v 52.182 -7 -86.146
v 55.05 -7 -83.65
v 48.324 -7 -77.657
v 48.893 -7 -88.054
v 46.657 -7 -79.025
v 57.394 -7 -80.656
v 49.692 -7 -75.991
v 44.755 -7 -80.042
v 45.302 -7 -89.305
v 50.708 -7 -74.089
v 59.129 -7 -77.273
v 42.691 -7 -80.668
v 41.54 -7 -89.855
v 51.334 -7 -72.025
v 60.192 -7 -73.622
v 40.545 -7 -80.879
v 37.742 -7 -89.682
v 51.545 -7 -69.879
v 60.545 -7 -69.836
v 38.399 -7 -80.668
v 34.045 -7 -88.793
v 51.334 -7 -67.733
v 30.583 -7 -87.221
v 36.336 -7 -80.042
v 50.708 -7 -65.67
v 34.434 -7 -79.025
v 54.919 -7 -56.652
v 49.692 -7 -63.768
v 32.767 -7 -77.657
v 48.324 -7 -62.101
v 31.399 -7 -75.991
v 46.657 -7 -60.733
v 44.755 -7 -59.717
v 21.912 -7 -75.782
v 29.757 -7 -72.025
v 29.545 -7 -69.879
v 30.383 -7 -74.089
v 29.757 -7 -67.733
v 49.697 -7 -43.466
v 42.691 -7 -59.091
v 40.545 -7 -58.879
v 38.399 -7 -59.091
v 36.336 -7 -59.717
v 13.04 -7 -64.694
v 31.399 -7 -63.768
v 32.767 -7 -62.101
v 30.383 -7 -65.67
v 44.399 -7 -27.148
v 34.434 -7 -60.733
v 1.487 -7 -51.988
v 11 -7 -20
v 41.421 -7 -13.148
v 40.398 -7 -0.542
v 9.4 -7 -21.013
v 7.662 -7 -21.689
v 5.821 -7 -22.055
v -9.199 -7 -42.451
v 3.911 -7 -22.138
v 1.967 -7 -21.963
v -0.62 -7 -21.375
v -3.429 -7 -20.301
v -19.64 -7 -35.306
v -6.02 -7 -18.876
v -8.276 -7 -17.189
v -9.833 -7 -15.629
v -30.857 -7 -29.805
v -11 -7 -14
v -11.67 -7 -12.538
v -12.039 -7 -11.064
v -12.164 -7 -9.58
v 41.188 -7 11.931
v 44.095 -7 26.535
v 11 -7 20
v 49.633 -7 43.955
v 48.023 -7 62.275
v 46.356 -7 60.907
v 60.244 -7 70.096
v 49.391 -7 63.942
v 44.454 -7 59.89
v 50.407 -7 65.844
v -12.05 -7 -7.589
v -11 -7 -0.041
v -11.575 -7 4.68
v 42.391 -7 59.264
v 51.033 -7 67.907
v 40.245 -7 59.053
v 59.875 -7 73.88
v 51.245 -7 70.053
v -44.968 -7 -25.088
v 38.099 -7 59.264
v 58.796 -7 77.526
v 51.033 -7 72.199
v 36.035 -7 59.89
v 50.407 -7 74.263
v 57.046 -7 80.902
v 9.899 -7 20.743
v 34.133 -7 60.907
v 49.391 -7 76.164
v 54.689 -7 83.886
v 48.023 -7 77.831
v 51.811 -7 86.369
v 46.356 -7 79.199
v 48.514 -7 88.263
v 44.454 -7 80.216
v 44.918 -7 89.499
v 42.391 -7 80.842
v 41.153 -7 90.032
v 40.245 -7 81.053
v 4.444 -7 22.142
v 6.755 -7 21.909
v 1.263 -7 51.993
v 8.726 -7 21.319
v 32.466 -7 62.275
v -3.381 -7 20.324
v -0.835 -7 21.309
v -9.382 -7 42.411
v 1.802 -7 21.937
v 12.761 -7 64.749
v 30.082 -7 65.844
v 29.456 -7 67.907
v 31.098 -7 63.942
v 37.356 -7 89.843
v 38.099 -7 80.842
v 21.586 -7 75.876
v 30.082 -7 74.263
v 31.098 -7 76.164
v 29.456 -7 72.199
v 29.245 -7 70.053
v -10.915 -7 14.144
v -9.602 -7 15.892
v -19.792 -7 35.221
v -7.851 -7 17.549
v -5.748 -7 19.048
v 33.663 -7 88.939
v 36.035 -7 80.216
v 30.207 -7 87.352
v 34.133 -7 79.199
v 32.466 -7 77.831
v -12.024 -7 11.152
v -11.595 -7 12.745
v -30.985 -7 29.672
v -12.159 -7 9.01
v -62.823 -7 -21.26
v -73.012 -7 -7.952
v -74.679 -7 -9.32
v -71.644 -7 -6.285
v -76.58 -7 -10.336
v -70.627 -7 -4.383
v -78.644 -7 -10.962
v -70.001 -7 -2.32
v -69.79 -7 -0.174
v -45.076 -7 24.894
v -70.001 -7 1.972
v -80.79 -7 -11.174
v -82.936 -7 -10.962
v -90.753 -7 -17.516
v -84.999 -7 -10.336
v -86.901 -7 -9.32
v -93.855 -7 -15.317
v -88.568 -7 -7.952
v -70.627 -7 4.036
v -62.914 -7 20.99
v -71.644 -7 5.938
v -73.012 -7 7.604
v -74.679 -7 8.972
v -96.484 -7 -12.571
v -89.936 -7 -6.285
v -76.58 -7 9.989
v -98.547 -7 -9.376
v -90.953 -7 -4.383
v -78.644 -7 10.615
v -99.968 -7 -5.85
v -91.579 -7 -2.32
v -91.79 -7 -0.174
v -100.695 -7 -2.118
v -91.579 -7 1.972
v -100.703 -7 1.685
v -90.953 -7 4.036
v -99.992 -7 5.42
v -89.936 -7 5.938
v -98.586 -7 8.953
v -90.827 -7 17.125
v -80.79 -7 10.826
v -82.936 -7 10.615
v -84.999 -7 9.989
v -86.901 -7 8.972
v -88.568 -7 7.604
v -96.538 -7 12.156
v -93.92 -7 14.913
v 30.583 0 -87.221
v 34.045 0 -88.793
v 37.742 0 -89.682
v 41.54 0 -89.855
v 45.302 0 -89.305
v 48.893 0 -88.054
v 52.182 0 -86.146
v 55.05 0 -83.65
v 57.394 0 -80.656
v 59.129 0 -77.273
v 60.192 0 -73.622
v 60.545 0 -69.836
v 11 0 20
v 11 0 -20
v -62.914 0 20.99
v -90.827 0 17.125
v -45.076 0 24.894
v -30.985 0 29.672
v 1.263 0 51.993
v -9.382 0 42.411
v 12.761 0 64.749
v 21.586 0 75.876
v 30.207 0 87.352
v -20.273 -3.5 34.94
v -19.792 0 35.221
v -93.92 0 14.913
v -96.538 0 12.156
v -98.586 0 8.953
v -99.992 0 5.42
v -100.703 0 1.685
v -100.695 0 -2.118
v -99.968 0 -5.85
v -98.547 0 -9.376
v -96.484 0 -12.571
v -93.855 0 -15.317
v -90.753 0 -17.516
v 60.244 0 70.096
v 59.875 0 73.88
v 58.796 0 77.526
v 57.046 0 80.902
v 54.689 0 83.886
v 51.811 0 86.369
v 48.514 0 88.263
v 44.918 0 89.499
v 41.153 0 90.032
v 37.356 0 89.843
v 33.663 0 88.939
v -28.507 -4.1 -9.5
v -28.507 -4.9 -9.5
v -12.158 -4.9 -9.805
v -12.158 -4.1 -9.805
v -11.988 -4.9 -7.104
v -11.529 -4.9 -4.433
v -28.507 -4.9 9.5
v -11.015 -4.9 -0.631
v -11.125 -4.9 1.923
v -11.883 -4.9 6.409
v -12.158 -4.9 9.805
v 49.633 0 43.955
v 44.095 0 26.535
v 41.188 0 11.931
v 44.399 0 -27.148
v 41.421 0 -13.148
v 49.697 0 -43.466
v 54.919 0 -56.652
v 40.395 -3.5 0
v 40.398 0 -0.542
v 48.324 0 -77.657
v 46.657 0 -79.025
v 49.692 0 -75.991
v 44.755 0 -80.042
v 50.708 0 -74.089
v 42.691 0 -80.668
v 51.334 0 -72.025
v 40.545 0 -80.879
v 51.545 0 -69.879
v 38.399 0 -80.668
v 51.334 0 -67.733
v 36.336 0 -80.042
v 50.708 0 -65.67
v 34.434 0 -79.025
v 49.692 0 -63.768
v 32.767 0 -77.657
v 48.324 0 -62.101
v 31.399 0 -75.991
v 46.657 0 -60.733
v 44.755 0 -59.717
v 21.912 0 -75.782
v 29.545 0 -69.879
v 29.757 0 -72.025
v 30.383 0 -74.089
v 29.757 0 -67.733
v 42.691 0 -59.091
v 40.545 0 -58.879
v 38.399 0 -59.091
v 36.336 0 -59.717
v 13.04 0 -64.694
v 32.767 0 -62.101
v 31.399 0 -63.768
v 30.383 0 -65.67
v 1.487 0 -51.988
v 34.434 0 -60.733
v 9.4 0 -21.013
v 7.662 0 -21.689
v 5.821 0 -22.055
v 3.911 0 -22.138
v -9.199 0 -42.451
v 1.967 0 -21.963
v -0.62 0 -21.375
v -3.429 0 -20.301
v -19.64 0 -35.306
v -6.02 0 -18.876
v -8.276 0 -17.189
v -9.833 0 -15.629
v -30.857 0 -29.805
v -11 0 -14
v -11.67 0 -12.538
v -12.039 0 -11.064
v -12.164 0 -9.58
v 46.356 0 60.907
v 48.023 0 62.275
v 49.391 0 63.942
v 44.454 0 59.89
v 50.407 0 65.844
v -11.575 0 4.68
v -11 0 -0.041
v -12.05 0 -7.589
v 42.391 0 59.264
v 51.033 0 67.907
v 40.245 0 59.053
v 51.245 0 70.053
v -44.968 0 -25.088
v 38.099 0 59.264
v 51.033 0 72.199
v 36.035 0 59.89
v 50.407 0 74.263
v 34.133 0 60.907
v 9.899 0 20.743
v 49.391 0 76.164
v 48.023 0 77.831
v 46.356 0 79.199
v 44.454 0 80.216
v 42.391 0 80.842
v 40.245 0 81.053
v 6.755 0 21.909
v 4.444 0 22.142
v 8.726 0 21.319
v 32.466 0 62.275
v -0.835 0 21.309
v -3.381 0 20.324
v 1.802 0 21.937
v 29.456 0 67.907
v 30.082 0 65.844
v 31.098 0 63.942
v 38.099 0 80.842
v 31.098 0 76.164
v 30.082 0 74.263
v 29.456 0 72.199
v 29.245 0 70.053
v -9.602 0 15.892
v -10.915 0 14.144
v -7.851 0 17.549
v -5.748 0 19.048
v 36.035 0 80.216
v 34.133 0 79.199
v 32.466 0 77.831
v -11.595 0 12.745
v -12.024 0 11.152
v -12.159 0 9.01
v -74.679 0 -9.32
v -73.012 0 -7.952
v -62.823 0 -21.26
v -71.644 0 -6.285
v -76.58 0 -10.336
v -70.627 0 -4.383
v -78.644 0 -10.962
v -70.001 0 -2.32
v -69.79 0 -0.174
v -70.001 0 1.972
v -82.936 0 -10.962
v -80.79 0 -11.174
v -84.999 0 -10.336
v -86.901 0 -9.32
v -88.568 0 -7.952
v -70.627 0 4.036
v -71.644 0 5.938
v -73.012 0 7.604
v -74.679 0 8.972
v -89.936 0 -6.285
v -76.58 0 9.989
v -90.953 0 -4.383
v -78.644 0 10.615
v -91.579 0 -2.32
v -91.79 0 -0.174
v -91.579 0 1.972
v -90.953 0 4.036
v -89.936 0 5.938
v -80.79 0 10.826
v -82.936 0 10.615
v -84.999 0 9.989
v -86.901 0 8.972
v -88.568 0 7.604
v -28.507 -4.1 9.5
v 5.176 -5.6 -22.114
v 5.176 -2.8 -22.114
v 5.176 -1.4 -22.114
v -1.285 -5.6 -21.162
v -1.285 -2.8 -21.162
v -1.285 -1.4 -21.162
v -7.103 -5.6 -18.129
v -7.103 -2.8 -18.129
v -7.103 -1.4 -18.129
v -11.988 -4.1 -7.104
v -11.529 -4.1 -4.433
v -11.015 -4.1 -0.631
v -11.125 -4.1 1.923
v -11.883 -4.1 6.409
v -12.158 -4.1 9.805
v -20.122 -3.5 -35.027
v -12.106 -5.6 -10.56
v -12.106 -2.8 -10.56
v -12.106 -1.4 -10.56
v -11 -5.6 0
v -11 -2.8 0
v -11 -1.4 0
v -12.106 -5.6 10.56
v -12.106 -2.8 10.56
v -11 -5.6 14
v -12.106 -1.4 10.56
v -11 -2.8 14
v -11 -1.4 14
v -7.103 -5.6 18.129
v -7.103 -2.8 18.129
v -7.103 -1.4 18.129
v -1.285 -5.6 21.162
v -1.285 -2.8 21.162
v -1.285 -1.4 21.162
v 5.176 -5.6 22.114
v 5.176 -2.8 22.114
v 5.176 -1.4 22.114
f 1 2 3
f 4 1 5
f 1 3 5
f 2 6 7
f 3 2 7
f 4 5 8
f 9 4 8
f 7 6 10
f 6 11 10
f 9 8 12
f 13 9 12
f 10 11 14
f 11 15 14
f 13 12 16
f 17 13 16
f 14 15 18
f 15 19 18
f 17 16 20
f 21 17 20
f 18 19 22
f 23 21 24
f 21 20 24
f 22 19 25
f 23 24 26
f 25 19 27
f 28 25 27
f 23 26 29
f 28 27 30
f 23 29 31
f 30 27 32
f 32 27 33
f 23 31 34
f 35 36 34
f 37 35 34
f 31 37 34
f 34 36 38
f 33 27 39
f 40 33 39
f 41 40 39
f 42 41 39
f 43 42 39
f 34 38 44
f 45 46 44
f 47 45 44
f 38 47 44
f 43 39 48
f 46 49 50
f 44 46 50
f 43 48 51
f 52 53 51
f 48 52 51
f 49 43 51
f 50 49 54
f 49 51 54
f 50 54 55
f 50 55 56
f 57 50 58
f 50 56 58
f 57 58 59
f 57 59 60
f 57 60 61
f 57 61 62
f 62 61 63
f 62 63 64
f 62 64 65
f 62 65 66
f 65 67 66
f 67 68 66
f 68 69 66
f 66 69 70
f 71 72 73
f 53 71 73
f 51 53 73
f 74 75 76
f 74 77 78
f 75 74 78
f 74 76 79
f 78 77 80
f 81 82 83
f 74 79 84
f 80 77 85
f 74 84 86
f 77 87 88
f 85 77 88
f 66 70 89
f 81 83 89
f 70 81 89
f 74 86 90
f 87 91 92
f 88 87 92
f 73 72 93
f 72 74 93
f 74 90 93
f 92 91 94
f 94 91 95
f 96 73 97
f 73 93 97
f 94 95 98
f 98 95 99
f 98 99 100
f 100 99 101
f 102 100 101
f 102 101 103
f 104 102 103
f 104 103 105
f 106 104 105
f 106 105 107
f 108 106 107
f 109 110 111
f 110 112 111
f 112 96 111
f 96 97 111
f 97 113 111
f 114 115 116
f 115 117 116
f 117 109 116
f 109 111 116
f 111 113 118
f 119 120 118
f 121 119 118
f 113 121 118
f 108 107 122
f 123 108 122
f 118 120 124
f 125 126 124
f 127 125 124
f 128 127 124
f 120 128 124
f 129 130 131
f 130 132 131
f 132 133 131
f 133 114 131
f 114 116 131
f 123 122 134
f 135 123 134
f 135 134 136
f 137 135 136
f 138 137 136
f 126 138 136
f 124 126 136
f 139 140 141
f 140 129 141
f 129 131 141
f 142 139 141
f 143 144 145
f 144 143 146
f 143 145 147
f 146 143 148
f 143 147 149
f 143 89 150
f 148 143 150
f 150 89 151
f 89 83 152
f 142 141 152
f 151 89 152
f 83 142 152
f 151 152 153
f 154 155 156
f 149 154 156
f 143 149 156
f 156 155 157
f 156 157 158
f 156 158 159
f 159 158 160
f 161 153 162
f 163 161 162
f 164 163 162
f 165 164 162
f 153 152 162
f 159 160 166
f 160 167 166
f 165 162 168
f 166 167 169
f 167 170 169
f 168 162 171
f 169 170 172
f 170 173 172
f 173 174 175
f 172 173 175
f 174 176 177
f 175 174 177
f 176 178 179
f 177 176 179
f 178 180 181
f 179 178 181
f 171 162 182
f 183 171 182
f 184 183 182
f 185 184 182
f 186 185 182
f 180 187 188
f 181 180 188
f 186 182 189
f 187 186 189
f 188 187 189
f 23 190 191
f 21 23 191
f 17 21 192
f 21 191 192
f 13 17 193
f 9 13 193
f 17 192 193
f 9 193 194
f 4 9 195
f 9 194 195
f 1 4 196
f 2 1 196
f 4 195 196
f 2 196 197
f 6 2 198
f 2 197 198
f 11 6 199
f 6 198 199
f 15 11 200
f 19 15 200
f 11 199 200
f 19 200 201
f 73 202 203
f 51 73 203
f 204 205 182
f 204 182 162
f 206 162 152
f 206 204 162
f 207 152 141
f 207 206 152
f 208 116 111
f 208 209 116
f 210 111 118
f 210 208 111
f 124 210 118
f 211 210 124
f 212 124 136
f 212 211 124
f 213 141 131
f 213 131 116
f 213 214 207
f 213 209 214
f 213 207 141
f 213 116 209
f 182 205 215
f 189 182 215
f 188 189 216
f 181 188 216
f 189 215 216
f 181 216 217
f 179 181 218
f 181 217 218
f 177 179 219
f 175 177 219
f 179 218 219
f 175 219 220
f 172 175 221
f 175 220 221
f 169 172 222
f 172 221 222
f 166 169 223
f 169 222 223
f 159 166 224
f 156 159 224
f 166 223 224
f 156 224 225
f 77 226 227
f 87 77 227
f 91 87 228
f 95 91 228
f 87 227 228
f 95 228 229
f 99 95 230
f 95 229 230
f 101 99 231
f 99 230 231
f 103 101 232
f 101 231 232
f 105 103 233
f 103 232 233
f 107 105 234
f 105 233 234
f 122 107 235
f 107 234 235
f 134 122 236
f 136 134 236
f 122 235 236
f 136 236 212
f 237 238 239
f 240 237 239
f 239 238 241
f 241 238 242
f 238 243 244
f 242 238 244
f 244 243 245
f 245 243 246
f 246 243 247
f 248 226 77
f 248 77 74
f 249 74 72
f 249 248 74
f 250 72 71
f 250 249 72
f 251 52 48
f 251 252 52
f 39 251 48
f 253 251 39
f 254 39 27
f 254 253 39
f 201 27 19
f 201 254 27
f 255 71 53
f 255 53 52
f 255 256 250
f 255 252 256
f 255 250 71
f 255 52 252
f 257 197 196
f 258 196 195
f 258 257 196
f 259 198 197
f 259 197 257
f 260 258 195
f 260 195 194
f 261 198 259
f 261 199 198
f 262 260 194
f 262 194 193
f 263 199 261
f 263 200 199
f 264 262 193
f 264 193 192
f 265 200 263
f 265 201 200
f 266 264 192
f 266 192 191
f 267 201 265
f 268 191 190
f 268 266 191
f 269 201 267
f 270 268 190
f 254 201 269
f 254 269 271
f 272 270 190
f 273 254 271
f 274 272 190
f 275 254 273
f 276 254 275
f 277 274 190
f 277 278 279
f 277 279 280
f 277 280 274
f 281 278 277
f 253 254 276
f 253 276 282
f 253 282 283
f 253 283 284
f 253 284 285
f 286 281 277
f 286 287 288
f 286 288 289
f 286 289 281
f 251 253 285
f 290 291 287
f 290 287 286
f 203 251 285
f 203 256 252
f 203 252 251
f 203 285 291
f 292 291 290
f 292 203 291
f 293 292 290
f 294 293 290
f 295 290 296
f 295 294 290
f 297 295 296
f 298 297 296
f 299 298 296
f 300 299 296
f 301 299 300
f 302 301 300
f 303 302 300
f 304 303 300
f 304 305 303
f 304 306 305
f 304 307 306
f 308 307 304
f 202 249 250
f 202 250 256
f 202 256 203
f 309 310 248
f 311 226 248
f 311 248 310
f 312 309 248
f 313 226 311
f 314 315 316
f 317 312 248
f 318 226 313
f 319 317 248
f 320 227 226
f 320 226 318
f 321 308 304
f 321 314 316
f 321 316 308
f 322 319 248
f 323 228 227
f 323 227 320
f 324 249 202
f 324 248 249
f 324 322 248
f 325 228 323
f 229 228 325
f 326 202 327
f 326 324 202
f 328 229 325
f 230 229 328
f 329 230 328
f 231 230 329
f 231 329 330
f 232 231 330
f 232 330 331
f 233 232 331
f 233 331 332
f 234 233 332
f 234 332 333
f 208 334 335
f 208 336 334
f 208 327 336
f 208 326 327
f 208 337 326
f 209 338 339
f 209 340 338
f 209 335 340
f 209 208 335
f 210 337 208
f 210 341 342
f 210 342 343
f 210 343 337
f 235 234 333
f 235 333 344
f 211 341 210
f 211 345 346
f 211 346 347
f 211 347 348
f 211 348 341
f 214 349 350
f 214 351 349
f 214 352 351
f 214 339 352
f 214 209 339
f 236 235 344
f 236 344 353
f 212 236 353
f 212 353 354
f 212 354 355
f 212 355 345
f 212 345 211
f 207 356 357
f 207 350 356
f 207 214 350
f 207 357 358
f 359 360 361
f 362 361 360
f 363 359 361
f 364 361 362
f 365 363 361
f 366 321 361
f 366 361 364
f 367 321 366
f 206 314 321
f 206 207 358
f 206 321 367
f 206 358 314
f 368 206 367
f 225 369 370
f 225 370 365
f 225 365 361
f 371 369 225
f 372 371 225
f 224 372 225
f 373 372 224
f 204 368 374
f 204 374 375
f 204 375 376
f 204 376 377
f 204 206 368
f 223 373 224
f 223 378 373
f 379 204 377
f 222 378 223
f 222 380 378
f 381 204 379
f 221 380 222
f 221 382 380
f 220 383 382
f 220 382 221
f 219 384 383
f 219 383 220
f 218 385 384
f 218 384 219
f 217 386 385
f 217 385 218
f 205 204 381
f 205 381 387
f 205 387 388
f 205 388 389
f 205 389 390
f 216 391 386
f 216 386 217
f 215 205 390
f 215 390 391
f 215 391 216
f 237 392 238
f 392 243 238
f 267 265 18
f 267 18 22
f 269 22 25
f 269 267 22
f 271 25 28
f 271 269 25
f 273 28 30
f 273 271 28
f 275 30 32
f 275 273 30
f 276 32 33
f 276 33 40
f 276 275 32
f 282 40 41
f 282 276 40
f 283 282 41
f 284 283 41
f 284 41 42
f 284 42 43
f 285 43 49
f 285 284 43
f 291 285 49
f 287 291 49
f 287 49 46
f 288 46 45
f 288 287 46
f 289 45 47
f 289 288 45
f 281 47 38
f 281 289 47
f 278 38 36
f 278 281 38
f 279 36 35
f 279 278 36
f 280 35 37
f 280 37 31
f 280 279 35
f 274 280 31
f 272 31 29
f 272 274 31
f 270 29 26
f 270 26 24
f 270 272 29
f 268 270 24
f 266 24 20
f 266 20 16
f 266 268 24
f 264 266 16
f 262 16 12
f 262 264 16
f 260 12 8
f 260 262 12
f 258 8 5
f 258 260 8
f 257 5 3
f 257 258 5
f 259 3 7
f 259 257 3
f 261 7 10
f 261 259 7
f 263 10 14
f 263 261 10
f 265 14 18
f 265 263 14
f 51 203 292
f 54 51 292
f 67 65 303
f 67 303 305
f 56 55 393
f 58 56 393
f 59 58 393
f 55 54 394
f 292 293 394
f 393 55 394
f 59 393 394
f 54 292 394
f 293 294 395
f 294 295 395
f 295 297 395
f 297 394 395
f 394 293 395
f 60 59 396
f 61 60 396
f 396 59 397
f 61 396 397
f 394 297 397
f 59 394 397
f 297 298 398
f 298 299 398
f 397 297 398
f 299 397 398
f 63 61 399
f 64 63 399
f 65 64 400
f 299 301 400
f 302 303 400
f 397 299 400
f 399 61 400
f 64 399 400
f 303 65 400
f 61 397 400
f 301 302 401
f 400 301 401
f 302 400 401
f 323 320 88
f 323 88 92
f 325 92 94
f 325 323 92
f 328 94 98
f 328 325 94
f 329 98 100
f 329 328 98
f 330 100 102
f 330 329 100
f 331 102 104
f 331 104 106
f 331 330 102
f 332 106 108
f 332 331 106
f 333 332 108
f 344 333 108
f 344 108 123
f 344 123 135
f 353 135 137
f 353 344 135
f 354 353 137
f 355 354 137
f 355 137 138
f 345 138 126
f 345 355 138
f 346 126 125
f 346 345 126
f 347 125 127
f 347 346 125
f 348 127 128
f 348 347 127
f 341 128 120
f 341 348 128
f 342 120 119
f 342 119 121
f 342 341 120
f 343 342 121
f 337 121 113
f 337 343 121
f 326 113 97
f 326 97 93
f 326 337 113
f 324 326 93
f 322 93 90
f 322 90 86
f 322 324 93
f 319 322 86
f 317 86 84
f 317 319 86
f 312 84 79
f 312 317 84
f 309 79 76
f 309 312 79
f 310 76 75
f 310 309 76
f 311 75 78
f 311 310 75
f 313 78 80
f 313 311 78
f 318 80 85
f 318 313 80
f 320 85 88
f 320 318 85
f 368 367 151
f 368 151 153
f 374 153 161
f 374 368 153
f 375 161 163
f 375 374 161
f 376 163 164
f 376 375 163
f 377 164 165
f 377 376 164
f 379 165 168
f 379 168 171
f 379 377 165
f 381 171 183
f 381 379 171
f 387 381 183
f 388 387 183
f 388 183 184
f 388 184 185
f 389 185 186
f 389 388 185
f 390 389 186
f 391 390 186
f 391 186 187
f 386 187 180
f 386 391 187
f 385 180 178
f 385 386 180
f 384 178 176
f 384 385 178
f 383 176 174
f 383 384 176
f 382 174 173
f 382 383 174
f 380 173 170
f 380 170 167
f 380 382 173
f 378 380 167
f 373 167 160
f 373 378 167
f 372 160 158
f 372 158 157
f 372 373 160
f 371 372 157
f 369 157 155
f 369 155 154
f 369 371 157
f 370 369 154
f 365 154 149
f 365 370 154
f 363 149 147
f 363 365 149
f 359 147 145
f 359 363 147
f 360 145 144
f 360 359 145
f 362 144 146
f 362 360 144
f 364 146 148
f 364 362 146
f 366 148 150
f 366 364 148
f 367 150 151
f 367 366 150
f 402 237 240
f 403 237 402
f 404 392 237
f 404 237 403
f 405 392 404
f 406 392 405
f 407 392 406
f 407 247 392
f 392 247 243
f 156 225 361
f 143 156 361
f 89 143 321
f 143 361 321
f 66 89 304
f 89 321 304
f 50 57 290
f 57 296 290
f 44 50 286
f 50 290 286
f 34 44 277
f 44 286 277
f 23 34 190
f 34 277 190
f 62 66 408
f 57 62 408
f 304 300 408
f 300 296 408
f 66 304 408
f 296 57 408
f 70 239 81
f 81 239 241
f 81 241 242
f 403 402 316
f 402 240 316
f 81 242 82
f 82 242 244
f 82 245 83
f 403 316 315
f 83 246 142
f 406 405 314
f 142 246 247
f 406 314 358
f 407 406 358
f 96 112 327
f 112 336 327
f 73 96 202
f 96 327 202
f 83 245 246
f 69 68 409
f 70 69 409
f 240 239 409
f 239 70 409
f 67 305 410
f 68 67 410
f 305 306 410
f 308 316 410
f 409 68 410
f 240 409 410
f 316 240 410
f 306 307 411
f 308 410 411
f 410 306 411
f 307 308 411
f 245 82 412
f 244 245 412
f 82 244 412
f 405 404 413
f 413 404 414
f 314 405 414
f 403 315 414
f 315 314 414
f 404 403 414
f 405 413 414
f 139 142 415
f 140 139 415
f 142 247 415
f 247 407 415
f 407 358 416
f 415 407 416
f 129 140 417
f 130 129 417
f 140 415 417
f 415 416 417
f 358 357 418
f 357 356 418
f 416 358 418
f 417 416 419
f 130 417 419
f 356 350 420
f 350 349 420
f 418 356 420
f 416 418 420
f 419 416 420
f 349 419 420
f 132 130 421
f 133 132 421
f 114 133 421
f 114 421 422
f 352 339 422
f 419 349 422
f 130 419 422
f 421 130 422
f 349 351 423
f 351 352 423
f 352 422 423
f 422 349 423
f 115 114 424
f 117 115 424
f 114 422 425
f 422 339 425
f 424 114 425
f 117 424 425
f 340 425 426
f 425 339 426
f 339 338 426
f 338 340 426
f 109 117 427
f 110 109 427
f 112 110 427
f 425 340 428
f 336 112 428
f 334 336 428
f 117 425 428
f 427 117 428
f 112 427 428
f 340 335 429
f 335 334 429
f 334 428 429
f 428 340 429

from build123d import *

# Parameters (mm, degrees)
F0_R     = 11
F1_DEPTH = 7
F4_DEPTH = 0.4


with BuildPart() as f1:
    # F0 (on Front) → F1 (new body)
    with BuildSketch(Plane.XZ):
        with BuildLine():
            add(Edge.make_bspline(
                [(-90.8271871838, 17.1252166849), (-65.6361619016, 20.1801984156), (-15.2541113371, 26.2901618769), (15.053487254, 66.9980498131), (30.2072865496, 87.3519937812)],
                knots=[0, 0, 0, 0, 0.5, 1, 1, 1, 1], degree=3))
            ThreePointArc((-90.8271871838, 17.1252166849), (-100.7899149472, -0.2167571218), (-90.7526889605, -17.5157193593))
            add(Edge.make_bspline(
                [(-90.7526889605, -17.5157193593), (-65.5487567691, -20.462322529), (-15.1408923865, -26.3555288685), (15.3415164695, -66.9326828214), (30.5827208975, -87.2212597979)],
                knots=[0, 0, 0, 0, 0.5, 1, 1, 1, 1], degree=3))
            ThreePointArc((30.5827208975, -87.2212597979), (50.5826746476, -87.1782482286), (60.5454024109, -69.8362744219))
            add(Edge.make_bspline(
                [(60.2444662863, 70.096043113), (50.2908494103, 46.7157233653), (30.3950343103, -0.0180945494), (50.4991257729, -46.5724539929), (60.5454024109, -69.8362744219)],
                knots=[0, 0, 0, 0, 0.5002869612, 1, 1, 1, 1], degree=3))
            ThreePointArc((60.2444662863, 70.096043113), (50.2072402996, 87.3950053505), (30.2072865496, 87.3519937812))
        make_face()
        with Locations((-80.7899611971, -0.1737455525)):
            Circle(F0_R, mode=Mode.SUBTRACT)
        with Locations((40.5454486609, -69.8792859912)):
            Circle(F0_R, mode=Mode.SUBTRACT)
        with BuildLine():
            add(Edge.make_bspline(
                [(-11, -14), (-13.6210738364, -9.4558803164), (-8.3789261636, 0), (-16.9662275077, 15.4899287121), (4.2288329874, 25.2994830421), (11, 20)],
                knots=[0, 0, 0, 0, 0.1601841539, 0.3203683079, 0.5248038347, 0.5248038347, 0.5248038347, 0.5248038347], degree=3))
            add(Edge.make_bspline(
                [(11, 20), (19.9679398291, 12.9812032463), (19.9679398291, -12.9812032463), (11, -20)],
                knots=[0.5248038347, 0.5248038347, 0.5248038347, 0.5248038347, 0.7955644732, 0.7955644732, 0.7955644732, 0.7955644732], degree=3))
            add(Edge.make_bspline(
                [(11, -20), (4.2288329874, -25.2994830421), (-7.6548463287, -19.7994469409), (-11, -14)],
                knots=[0.7955644732, 0.7955644732, 0.7955644732, 0.7955644732, 1, 1, 1, 1], degree=3))
        make_face(mode=Mode.SUBTRACT)
        with Locations((40.2445125363, 70.0530315437)):
            Circle(F0_R, mode=Mode.SUBTRACT)
        with BuildLine():
            Line((11, 20), (11, 0))
            Line((11, 0), (11, -20))
            add(Edge.make_bspline(
                [(11, 20), (19.9679398291, 12.9812032463), (19.9679398291, -12.9812032463), (11, -20)],
                knots=[0.5248038347, 0.5248038347, 0.5248038347, 0.5248038347, 0.7955644732, 0.7955644732, 0.7955644732, 0.7955644732], degree=3))
        make_face()
    extrude(amount=F1_DEPTH)

    # F3 (on offset) → F4 (cut, symmetric)
    with BuildSketch(Plane.XZ.offset(4.5)):
        Polygon((-28.5066514462, 9.5), (-28.5066514462, 0), (-28.5066514462, -9.5), (-9.7575942054, -9.85), (-9.7575942054, 0), (-9.7575942054, 9.85), align=None)
    extrude(amount=F4_DEPTH, both=True, mode=Mode.SUBTRACT)


solid = f1.part
